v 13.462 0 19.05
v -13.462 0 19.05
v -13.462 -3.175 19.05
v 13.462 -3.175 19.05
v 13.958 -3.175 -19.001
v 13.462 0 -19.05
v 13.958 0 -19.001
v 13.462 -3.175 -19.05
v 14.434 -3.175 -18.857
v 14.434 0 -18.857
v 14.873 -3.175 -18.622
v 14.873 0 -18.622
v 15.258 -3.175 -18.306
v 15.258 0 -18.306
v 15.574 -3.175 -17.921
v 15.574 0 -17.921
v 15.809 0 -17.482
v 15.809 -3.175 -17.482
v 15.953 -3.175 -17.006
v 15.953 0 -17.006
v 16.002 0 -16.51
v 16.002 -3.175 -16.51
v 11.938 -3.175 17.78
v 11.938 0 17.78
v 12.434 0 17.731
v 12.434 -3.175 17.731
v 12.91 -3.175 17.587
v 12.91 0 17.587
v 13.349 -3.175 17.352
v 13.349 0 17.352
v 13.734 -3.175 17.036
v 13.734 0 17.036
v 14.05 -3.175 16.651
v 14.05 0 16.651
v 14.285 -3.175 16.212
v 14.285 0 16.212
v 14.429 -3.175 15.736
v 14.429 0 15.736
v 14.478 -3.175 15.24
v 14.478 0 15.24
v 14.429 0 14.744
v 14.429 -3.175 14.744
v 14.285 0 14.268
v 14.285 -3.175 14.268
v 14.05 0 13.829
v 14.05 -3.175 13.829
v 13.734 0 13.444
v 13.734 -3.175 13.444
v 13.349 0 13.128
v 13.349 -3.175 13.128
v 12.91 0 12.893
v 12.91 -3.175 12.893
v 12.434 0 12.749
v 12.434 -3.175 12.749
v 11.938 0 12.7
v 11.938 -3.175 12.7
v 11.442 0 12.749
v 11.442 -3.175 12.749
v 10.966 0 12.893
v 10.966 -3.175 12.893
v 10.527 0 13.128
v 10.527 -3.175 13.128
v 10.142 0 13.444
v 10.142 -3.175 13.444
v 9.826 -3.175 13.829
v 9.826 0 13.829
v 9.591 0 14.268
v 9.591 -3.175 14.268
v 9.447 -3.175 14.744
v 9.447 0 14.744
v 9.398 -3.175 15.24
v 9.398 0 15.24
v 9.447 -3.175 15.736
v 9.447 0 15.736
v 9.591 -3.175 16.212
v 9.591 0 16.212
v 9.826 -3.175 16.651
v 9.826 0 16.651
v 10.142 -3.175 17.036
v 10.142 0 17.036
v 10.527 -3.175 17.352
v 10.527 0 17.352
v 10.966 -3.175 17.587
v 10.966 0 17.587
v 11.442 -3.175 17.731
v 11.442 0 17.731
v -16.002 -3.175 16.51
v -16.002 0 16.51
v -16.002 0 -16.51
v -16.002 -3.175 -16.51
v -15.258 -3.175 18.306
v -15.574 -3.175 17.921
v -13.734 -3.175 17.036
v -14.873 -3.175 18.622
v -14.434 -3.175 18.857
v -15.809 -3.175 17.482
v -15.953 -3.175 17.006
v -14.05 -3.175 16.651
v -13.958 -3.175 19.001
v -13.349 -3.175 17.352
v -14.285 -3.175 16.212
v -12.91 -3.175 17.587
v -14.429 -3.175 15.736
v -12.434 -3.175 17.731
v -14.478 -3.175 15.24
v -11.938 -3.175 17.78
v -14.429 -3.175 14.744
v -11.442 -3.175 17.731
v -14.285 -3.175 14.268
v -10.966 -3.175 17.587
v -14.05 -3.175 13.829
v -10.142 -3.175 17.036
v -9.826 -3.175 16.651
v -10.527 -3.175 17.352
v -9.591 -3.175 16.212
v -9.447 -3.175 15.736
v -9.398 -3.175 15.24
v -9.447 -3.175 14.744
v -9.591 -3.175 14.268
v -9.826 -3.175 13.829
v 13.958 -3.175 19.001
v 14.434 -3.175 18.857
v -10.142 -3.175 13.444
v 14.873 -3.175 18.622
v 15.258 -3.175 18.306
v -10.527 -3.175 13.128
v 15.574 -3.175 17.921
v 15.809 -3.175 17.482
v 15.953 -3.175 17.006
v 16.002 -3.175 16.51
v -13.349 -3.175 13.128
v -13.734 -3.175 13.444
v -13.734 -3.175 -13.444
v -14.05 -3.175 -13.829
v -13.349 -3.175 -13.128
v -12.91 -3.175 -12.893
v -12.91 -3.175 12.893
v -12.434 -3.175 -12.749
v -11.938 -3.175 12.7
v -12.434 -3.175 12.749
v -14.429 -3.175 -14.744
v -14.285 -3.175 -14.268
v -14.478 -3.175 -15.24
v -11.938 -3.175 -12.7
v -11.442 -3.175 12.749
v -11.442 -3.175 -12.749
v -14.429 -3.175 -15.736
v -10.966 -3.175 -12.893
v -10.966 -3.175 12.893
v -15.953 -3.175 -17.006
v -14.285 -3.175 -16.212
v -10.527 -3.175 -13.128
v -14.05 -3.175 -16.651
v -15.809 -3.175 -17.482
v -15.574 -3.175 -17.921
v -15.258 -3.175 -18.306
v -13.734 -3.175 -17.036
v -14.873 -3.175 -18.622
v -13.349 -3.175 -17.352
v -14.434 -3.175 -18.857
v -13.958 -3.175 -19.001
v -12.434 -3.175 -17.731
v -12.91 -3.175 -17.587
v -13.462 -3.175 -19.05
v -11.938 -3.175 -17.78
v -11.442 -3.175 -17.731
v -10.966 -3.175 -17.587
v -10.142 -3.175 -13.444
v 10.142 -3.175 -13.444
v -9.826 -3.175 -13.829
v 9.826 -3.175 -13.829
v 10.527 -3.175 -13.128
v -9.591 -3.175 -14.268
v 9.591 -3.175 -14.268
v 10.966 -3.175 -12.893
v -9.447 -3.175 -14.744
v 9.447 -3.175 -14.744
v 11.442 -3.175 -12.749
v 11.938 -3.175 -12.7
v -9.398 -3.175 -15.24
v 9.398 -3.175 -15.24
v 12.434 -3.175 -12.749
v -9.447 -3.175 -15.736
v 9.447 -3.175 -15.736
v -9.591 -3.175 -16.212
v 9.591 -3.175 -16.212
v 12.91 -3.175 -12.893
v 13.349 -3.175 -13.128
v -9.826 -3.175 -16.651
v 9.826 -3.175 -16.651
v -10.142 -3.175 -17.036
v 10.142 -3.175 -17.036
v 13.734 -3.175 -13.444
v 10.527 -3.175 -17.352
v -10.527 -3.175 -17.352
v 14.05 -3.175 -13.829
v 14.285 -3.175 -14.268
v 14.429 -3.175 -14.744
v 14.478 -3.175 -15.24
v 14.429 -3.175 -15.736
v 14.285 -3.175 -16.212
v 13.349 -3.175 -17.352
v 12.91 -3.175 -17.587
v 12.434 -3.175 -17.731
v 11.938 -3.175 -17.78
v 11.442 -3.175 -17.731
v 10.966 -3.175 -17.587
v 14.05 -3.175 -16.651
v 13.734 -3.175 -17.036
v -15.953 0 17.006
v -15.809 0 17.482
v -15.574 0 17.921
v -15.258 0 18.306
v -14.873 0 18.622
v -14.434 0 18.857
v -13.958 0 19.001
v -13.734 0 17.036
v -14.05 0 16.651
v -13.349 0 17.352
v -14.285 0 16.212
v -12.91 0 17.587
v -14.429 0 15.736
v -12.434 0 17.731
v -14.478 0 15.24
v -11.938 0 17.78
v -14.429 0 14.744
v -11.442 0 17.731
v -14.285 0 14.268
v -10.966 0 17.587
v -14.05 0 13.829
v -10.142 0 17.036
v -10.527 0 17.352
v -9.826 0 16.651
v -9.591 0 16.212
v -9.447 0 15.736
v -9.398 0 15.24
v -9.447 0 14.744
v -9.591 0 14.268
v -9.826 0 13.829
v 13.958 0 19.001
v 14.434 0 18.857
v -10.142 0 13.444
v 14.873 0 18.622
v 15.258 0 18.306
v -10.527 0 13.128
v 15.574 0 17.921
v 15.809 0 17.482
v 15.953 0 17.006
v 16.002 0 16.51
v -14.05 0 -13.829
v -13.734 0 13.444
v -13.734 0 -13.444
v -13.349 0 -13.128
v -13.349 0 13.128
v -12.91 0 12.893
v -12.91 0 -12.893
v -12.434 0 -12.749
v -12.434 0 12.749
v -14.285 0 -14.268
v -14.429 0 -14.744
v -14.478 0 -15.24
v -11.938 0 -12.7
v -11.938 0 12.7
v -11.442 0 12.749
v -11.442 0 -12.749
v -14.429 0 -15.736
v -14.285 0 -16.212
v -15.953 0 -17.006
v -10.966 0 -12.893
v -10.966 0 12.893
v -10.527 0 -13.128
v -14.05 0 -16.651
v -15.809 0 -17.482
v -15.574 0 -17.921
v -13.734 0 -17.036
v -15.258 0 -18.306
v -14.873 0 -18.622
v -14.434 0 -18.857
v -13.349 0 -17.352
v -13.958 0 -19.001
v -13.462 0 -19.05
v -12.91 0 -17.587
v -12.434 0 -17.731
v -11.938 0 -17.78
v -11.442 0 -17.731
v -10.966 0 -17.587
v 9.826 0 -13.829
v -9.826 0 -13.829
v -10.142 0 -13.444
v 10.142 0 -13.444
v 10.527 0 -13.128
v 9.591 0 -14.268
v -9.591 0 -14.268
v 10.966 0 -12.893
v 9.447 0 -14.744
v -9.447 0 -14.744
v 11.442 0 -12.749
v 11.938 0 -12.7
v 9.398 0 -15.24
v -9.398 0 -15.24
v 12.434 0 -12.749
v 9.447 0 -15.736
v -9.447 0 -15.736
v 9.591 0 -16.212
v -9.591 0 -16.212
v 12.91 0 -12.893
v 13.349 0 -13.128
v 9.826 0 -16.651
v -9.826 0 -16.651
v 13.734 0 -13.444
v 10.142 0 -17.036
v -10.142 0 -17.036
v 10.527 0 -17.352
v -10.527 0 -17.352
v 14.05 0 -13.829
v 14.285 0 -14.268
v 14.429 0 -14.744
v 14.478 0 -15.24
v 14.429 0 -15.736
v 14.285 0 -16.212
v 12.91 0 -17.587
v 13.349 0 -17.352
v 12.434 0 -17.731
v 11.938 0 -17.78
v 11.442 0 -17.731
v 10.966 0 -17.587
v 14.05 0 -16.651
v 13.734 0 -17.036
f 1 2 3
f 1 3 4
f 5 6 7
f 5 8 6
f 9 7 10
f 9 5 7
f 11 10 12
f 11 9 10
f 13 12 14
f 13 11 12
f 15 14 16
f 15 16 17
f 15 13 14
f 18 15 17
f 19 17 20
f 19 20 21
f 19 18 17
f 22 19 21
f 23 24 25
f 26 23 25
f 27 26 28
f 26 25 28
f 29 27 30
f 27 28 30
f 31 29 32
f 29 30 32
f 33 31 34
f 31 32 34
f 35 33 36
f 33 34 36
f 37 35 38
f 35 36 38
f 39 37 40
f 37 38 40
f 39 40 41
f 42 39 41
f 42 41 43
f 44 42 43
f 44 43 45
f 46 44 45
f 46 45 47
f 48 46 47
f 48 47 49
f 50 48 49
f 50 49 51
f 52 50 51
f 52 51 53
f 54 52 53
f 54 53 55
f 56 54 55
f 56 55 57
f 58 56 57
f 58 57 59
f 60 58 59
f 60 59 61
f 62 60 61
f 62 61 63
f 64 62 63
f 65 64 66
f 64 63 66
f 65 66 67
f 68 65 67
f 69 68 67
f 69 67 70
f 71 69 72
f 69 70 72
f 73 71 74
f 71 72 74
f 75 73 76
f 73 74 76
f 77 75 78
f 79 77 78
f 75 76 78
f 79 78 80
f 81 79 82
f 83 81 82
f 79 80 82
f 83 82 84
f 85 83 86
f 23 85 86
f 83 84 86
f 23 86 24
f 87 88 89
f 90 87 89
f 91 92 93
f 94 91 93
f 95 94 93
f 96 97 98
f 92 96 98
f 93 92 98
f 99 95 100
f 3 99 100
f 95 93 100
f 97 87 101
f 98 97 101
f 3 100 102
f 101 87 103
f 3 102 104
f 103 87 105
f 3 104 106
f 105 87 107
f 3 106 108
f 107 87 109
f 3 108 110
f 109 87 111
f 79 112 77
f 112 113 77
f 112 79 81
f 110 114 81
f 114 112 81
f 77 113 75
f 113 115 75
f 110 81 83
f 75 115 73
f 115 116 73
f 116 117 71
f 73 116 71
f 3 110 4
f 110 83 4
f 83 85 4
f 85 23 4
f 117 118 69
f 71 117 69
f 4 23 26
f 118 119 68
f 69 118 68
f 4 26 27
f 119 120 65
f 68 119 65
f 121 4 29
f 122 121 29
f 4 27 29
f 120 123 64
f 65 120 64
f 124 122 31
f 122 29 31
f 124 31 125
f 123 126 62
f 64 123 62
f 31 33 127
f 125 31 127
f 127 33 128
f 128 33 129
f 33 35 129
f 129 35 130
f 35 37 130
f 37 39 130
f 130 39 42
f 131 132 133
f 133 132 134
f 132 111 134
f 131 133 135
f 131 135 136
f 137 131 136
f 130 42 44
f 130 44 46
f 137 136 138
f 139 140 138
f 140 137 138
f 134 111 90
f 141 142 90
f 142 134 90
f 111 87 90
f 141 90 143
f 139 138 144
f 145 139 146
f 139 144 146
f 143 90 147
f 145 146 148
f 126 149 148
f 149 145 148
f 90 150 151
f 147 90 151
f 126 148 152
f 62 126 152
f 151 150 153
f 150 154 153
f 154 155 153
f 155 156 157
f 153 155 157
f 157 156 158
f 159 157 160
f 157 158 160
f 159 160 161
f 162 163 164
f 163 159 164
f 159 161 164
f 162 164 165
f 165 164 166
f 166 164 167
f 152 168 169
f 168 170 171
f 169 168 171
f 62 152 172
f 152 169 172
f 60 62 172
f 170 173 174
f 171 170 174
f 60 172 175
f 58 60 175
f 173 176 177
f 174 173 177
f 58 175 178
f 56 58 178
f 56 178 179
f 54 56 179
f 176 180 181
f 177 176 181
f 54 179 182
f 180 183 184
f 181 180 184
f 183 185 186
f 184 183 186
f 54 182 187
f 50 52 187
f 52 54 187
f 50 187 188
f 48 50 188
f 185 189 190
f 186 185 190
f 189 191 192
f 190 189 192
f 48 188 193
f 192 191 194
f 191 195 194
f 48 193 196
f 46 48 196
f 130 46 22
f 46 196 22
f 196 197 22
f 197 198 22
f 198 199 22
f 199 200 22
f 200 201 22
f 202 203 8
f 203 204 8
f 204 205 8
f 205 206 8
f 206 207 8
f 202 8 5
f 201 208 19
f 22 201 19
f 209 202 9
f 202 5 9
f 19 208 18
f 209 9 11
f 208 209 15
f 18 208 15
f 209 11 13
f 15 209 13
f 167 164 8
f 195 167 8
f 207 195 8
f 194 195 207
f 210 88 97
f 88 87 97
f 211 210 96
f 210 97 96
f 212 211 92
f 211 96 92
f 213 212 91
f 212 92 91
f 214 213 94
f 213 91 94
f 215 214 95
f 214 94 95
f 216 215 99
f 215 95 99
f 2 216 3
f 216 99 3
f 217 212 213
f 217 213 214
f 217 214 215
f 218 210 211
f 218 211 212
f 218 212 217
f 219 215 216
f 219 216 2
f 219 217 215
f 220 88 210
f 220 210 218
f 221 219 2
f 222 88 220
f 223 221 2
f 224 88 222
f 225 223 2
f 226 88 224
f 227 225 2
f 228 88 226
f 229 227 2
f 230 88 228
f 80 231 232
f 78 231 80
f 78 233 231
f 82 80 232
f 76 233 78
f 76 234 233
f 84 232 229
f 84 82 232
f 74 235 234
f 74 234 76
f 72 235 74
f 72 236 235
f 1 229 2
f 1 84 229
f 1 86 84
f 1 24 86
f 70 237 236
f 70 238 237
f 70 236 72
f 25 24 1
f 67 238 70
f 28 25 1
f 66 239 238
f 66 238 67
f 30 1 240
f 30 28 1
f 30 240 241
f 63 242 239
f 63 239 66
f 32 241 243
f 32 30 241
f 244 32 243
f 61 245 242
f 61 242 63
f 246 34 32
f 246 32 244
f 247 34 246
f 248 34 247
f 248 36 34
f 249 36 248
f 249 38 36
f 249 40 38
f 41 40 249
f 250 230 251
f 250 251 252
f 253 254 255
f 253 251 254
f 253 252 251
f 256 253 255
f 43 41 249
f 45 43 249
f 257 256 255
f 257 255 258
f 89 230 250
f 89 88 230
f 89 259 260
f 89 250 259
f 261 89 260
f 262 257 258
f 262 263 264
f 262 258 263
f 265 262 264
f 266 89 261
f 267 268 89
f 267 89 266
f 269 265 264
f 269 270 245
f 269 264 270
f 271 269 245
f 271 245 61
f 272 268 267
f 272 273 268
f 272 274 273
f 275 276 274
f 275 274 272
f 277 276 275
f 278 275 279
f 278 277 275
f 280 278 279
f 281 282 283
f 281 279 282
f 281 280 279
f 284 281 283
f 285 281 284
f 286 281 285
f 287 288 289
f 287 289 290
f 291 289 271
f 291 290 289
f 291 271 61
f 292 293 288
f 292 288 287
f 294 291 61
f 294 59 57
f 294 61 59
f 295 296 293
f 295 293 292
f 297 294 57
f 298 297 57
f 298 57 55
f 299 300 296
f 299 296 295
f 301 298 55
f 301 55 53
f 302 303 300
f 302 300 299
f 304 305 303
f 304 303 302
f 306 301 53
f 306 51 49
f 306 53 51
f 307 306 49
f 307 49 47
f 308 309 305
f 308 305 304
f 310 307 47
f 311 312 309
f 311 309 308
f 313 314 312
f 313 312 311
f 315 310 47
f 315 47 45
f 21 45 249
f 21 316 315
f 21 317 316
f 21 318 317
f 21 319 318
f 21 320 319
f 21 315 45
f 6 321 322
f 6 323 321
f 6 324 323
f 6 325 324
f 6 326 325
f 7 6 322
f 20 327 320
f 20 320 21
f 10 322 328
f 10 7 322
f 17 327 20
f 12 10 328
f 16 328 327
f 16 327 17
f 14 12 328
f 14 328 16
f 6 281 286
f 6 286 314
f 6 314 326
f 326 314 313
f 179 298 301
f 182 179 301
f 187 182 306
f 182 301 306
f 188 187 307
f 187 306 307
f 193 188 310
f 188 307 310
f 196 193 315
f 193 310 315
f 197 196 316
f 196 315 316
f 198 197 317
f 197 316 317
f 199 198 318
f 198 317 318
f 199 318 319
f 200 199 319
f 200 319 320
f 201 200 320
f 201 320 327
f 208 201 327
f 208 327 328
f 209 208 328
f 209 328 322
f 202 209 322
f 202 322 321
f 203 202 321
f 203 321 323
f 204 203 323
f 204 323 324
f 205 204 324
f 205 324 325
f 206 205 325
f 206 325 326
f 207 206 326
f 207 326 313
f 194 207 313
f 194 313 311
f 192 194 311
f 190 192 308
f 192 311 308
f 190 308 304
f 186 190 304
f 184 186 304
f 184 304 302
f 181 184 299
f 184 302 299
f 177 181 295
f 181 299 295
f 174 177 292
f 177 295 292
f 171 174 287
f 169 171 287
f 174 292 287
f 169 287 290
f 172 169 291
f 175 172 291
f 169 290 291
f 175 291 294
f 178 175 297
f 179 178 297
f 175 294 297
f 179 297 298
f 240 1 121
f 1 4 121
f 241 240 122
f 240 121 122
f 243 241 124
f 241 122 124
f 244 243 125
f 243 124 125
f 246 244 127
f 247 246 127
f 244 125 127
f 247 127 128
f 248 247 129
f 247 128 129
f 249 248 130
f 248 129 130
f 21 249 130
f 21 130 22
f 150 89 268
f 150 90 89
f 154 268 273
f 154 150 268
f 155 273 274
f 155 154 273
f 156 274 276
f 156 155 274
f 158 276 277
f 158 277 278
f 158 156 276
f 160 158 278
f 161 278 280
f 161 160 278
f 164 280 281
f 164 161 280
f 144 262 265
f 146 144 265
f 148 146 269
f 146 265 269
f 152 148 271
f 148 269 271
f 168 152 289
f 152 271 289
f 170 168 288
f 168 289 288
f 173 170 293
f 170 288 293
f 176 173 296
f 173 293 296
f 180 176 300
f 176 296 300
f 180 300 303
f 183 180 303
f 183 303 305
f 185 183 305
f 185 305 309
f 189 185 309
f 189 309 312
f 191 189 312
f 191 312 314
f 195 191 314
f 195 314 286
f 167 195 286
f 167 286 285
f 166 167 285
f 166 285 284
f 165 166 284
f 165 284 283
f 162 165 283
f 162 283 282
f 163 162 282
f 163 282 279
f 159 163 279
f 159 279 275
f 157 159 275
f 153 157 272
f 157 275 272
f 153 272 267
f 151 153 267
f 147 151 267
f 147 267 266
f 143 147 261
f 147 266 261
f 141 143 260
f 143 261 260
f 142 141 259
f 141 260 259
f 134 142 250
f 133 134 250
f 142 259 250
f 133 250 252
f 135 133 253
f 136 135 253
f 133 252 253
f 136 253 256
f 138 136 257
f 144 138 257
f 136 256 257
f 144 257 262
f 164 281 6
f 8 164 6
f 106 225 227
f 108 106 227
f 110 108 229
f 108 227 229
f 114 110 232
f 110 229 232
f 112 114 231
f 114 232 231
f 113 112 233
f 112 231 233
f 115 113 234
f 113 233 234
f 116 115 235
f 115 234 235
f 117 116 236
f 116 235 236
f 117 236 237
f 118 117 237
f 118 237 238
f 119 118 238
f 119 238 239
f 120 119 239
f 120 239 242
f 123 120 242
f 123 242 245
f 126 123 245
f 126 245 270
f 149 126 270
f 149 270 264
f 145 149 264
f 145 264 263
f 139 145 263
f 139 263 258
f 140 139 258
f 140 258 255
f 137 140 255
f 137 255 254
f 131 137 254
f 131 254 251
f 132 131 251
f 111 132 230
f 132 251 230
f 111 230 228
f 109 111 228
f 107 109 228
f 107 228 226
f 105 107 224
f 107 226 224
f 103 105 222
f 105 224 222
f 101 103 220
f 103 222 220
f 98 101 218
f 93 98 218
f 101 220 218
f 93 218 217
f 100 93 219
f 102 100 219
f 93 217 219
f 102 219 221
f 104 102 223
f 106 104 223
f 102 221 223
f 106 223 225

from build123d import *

# Parameters (mm, degrees)
SKETCH3_W           = 32.004
SKETCH3_H           = 38.1
BOSS_EXTRUDE1_DEPTH = 3.175
SKETCH4_R           = 2.54
CUT_EXTRUDE1_DEPTH  = 26.080811969
FILLET1_R           = 2.54


with BuildPart() as part:
    # Sketch3 → Boss-Extrude1 (new body)
    with BuildSketch(Plane(origin=(0, 0, 0), x_dir=(1, 0, 0), z_dir=(0, 1, 0))):
        Rectangle(SKETCH3_W, SKETCH3_H)
    extrude(amount=-BOSS_EXTRUDE1_DEPTH)

    # Sketch4 → Cut-Extrude1 (cut, through all)
    with BuildSketch(Plane(origin=(0, 0, 0), x_dir=(1, 0, 0), z_dir=(0, 1, 0))):
        with Locations(Location((11.938, 15.24, 0), (0, 0, 270))):
            Circle(SKETCH4_R)
        with Locations(Location((-11.938, 15.24, 0), (0, 0, 270))):
            Circle(SKETCH4_R)
        with Locations(Location((-11.938, -15.24, 0), (0, 0, 270))):
            Circle(SKETCH4_R)
        with Locations(Location((11.938, -15.24, 0), (0, 0, 270))):
            Circle(SKETCH4_R)
    extrude(amount=-CUT_EXTRUDE1_DEPTH, mode=Mode.SUBTRACT)

    # Fillet1
    fillet1_edges = [part.edges().sort_by_distance(p)[0] for p in [
        (-16.002, -1.5875, -19.05),
        (16.002, -1.5875, -19.05),
        (16.002, -1.5875, 19.05),
        (-16.002, -1.5875, 19.05),
    ]]
    fillet(fillet1_edges, radius=FILLET1_R)


solid = part.part
